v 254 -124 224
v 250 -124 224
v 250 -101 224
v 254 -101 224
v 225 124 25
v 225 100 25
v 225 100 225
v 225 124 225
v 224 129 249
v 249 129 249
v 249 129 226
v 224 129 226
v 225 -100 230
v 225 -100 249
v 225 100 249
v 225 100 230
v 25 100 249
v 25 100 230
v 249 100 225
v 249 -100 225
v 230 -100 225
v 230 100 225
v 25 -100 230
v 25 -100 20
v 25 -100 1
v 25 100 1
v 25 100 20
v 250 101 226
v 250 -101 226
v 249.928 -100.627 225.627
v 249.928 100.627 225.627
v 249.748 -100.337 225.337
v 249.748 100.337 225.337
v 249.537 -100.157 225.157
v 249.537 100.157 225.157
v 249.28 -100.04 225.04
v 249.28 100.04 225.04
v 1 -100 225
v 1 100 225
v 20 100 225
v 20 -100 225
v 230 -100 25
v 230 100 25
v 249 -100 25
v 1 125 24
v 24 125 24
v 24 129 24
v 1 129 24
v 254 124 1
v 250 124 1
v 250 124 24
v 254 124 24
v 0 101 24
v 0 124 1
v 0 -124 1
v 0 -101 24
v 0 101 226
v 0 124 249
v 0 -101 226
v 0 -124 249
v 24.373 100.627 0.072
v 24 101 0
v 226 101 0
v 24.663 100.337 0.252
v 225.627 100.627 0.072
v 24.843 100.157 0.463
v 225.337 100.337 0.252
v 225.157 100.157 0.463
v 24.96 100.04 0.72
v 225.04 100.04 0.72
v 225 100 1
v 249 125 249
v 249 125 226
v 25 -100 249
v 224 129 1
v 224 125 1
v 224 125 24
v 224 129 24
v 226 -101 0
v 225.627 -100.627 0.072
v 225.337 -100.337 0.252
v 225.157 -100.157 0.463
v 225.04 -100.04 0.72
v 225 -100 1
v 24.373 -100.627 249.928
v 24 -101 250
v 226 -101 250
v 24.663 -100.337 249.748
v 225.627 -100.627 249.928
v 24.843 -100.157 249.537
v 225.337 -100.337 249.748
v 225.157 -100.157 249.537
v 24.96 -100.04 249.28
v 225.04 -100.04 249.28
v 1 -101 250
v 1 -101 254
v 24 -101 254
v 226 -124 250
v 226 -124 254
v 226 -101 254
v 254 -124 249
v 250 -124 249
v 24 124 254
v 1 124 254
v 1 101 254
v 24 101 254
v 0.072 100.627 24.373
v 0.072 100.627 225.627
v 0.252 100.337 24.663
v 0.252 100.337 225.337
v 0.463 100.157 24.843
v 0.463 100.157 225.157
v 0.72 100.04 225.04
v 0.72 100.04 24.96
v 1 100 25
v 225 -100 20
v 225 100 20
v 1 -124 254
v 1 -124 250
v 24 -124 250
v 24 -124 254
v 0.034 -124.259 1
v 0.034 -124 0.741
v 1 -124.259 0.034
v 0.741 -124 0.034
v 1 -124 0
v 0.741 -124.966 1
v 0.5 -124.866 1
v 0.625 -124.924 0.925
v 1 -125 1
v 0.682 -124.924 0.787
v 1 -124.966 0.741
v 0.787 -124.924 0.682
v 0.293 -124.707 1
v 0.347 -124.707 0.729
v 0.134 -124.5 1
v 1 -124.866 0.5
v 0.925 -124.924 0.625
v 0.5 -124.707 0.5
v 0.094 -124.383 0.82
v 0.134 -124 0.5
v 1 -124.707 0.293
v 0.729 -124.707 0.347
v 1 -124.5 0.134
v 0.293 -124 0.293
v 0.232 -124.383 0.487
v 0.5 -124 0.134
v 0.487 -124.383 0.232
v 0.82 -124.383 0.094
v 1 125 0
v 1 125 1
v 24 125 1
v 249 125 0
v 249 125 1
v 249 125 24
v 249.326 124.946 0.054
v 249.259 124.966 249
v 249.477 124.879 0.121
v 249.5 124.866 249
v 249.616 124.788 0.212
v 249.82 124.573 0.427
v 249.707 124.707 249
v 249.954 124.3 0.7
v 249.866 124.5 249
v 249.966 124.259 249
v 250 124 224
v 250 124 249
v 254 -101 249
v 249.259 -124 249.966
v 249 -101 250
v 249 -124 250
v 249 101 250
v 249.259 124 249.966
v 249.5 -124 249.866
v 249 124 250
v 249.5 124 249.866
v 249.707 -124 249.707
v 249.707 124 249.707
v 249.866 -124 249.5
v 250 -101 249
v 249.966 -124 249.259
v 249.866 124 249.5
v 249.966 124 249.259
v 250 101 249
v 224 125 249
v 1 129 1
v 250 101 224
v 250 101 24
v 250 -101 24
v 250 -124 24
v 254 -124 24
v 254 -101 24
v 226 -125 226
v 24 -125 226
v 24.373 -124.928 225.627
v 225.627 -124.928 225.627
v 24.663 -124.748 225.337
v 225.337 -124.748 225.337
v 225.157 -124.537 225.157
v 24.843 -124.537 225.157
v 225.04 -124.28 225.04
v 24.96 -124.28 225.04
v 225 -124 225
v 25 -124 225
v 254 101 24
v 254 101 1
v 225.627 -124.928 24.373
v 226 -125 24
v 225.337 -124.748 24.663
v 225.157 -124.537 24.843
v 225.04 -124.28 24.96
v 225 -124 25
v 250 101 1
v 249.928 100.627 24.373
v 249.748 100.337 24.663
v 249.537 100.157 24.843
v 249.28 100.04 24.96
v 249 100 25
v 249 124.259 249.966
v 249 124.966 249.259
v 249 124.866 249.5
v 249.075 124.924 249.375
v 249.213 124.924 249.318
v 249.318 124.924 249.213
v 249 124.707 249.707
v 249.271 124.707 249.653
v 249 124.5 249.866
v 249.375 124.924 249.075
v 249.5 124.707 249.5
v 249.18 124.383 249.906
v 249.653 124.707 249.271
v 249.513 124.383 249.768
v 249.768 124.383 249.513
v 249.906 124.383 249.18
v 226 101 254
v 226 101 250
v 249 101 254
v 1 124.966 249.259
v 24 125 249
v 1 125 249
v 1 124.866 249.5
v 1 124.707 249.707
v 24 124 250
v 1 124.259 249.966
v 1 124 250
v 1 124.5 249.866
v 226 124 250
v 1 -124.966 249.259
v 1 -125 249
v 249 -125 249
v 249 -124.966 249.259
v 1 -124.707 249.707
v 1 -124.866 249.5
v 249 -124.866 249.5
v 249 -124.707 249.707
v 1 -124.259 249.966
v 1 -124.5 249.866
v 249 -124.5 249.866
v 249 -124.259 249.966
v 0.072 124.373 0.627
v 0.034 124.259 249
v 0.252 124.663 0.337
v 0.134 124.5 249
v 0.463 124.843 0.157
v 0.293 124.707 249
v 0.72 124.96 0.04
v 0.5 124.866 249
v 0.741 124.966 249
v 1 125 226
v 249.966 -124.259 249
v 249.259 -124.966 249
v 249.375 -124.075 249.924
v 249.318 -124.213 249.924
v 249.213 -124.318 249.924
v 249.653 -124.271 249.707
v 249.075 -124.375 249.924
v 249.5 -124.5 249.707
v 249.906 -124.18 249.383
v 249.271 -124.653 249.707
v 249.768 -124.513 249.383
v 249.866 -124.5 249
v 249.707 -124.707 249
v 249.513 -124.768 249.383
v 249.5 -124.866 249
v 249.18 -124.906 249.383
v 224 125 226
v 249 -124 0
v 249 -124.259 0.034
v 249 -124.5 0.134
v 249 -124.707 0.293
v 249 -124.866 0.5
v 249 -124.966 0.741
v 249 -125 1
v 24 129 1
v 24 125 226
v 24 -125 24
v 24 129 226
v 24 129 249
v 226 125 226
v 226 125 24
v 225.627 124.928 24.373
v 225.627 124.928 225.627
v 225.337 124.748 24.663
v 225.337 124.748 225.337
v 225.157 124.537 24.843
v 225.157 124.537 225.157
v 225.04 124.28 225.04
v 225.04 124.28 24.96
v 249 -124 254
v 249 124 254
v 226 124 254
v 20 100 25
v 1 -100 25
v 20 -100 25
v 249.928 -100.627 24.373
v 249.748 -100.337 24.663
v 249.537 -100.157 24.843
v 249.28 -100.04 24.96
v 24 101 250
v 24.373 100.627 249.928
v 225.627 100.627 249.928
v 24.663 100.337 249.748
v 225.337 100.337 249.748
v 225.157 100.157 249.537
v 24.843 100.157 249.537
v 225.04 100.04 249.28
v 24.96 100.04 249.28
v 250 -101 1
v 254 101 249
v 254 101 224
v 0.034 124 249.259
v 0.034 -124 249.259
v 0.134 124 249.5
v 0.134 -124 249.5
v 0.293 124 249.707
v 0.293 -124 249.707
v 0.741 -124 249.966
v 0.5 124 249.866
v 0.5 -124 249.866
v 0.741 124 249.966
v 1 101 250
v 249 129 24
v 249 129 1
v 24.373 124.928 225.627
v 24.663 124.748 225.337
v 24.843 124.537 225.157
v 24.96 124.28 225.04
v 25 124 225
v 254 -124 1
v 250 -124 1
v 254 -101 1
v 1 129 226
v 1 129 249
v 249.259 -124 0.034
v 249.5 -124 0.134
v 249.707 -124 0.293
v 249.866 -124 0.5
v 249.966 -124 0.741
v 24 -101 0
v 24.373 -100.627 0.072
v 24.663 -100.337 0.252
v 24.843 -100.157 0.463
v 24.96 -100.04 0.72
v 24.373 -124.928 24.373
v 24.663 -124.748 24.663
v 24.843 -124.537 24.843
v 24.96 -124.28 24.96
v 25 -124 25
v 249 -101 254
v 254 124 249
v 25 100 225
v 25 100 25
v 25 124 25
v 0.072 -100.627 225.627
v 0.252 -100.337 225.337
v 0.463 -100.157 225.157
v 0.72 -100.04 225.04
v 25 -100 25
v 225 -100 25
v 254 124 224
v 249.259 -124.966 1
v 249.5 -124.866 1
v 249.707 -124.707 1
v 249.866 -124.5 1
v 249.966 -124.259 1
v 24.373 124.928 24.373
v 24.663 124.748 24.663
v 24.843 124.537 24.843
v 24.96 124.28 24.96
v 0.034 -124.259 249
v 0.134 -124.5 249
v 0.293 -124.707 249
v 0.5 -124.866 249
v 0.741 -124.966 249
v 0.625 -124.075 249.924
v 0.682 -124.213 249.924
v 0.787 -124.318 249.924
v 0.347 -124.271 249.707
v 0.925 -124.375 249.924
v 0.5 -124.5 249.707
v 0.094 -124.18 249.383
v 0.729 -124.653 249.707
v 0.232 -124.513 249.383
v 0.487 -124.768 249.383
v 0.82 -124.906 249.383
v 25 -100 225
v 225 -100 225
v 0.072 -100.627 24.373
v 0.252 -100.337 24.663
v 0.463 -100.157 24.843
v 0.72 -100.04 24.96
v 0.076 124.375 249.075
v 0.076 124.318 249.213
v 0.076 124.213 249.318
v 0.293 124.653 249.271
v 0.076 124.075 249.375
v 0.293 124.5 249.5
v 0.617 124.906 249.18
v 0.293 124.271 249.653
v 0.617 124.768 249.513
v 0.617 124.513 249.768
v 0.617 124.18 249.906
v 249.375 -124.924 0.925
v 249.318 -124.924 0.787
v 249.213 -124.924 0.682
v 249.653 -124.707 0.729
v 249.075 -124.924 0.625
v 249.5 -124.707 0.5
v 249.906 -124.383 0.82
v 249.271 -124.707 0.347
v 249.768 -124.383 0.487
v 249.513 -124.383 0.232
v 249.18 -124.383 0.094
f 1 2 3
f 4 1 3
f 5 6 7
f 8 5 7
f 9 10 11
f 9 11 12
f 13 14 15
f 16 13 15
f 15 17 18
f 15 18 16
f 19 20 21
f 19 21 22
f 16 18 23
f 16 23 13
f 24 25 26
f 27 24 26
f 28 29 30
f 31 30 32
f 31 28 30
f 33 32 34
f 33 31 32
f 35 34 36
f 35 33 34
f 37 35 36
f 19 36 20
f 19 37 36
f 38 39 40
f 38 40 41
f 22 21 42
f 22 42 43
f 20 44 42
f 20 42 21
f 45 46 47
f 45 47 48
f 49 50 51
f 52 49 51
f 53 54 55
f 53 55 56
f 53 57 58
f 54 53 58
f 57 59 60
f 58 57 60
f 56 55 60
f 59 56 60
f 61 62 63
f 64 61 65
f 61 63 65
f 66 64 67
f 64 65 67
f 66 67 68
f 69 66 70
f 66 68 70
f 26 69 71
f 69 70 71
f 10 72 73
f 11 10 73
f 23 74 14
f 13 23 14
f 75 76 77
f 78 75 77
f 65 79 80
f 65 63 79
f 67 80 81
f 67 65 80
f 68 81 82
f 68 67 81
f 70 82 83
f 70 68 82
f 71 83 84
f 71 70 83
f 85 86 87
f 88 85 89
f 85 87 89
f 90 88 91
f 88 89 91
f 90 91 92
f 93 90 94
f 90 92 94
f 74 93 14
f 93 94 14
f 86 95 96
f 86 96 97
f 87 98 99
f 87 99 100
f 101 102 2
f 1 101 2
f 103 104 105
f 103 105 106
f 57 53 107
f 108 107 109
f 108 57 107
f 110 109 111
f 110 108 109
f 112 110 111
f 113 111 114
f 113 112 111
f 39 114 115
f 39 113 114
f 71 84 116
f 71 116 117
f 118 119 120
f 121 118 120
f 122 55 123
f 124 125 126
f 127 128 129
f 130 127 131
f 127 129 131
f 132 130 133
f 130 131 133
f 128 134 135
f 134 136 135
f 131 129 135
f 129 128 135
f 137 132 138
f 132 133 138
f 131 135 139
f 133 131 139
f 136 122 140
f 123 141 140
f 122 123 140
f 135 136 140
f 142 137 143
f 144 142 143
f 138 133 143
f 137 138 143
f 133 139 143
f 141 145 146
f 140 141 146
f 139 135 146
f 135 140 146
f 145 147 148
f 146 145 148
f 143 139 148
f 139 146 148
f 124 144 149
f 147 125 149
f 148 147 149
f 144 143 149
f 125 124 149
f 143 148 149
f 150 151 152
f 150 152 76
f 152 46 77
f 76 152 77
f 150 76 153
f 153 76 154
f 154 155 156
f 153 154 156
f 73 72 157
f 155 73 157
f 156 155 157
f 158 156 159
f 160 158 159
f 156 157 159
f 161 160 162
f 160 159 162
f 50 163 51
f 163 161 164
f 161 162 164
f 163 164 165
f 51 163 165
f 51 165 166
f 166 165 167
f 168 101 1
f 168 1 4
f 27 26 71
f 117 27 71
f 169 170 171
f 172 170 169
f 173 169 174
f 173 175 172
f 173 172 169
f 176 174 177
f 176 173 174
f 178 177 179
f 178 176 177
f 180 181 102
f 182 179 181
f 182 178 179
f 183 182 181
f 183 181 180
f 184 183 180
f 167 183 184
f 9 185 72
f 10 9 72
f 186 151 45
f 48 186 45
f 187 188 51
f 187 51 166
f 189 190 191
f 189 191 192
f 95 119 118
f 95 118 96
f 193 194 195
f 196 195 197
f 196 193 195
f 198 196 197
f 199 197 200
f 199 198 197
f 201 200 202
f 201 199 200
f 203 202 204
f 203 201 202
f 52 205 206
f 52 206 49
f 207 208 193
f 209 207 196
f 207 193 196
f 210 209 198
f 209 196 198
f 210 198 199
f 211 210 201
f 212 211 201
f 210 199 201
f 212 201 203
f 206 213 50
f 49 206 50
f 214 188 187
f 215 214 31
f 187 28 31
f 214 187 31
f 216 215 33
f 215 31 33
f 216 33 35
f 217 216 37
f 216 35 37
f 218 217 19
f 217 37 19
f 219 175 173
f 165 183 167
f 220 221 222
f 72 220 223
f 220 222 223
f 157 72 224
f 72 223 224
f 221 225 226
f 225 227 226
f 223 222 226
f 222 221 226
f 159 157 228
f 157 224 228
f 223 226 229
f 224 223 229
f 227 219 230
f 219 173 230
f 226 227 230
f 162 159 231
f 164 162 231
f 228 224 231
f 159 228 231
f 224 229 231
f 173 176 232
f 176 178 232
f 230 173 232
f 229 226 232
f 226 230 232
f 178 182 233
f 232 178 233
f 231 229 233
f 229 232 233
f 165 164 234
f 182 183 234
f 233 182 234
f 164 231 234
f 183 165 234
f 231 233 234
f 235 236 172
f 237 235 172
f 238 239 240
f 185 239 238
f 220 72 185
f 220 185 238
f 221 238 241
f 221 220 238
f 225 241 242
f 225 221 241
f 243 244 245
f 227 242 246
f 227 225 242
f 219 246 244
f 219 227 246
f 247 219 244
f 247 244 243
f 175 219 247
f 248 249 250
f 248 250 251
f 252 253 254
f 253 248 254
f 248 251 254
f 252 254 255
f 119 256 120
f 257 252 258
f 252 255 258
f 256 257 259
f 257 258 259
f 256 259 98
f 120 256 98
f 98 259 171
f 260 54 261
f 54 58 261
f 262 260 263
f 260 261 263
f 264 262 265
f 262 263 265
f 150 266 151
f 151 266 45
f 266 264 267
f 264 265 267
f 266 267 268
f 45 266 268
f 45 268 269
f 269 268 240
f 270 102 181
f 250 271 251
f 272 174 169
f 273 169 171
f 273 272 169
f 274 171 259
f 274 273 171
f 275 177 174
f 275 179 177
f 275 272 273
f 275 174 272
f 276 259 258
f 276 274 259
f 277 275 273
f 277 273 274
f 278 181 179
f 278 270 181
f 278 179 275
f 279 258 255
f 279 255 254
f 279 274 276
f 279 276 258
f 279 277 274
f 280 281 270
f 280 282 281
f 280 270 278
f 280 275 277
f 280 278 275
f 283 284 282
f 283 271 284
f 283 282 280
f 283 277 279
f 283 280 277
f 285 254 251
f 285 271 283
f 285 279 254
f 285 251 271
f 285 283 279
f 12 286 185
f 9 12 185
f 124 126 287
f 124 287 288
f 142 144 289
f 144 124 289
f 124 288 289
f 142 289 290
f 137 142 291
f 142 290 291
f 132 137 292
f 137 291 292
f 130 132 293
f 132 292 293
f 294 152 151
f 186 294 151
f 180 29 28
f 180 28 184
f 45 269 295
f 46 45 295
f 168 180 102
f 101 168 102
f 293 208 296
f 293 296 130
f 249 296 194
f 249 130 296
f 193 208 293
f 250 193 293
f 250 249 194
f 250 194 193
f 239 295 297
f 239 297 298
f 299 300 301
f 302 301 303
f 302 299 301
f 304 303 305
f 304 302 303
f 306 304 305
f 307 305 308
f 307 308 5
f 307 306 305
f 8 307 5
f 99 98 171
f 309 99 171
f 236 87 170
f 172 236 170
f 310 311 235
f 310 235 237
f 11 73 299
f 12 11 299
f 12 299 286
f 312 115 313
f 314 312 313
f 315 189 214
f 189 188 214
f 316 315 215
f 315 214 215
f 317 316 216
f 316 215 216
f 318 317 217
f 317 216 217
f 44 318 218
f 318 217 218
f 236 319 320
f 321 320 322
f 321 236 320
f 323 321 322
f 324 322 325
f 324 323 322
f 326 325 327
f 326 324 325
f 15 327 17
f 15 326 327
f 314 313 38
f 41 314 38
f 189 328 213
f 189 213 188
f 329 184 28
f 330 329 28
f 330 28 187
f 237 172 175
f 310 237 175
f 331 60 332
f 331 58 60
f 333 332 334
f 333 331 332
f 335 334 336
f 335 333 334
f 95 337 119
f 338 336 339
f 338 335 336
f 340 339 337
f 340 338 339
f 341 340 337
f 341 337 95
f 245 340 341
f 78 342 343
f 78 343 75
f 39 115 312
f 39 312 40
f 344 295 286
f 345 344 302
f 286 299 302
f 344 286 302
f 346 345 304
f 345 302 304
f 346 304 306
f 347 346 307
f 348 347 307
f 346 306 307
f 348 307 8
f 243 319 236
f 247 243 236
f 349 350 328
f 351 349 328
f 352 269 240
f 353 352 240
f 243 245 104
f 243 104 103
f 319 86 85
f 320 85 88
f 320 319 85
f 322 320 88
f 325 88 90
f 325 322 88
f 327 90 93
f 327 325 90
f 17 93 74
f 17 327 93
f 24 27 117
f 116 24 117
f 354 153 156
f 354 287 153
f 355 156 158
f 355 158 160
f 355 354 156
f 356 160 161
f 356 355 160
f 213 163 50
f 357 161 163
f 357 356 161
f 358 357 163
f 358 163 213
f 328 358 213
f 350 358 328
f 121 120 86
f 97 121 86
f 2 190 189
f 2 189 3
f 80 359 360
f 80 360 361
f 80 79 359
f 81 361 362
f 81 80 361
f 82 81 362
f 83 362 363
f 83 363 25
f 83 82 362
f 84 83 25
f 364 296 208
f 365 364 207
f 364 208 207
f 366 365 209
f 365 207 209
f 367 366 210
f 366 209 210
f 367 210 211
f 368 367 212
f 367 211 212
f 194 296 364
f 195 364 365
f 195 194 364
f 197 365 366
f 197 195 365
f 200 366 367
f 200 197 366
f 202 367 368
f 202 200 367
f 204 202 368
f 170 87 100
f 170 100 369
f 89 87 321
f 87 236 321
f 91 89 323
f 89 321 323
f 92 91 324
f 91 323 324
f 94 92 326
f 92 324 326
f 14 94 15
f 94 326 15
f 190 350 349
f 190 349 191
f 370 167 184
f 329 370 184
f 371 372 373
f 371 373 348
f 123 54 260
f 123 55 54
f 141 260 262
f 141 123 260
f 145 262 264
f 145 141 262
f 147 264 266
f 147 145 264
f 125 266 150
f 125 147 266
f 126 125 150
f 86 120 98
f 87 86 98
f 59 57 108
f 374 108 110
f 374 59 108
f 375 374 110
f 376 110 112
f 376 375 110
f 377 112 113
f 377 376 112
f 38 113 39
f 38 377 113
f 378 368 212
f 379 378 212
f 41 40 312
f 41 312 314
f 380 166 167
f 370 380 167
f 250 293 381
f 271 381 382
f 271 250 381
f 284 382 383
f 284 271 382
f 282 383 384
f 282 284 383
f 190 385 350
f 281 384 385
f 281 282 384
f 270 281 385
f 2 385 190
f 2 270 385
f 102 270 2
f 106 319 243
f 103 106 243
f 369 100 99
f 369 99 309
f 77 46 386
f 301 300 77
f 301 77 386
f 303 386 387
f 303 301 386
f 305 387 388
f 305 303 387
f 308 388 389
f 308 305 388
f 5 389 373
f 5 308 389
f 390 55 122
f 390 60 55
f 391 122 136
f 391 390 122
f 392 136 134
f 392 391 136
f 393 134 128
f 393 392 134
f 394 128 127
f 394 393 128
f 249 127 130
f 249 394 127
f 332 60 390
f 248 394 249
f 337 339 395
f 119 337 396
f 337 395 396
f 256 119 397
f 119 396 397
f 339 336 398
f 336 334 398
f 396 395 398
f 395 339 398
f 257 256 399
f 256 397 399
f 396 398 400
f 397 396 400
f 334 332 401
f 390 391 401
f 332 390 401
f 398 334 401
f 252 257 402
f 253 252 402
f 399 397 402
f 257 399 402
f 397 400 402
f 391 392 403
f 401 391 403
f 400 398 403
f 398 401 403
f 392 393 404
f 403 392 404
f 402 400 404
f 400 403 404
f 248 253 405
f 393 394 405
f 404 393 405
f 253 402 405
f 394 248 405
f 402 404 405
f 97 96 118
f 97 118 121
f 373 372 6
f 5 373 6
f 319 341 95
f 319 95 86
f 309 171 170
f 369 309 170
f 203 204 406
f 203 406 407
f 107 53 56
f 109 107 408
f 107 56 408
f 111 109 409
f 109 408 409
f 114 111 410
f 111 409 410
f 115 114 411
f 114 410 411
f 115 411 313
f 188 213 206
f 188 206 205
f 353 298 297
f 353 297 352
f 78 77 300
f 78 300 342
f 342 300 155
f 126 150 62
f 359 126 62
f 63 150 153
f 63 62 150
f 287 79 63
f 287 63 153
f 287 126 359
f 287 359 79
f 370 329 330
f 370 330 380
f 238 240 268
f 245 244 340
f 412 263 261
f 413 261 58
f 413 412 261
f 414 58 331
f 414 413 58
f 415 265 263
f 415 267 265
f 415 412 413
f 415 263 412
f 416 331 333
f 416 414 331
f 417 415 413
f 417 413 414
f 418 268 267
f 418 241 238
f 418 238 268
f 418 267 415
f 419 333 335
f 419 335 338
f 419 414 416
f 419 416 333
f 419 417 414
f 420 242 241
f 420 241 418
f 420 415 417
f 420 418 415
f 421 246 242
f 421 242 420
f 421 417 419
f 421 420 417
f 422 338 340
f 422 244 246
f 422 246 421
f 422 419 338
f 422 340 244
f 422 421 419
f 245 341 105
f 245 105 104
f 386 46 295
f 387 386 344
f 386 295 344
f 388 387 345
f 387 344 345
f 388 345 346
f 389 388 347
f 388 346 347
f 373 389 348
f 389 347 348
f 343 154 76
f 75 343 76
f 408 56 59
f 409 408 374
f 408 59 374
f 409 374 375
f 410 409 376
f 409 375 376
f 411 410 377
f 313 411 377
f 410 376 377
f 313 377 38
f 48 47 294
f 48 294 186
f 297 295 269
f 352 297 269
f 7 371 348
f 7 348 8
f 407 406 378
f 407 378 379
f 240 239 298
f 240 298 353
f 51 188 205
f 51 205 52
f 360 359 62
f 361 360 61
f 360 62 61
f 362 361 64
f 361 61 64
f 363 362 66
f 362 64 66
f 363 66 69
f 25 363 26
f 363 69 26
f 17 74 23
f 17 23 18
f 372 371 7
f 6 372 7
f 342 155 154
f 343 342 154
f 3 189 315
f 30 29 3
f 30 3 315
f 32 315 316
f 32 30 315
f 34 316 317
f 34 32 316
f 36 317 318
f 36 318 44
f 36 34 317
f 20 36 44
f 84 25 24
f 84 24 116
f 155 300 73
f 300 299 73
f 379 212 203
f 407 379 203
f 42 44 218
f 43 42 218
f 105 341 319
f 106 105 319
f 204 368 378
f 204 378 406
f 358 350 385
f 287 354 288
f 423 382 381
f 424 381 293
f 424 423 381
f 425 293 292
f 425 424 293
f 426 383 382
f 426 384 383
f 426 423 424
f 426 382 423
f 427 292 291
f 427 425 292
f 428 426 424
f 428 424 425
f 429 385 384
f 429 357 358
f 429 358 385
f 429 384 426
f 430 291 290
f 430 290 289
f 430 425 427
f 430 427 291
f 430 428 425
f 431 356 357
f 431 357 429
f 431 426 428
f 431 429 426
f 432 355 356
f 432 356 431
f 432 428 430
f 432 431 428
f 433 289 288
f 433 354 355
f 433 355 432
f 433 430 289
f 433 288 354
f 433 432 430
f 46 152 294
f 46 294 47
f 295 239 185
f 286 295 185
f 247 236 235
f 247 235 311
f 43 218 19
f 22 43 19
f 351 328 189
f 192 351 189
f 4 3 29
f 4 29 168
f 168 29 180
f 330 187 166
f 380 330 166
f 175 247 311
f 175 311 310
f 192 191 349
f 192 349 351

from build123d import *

# Parameters (mm, degrees)
F0_W      = 250
F0_H      = 250
F0_W_2    = 200
F0_H_2    = 200
F1_DEPTH  = 125
F2_W      = 200
F2_H      = 200
F3_DEPTH  = 100
F4_W      = 200
F4_H      = 200
F5_DEPTH  = 20
F6_W      = 200
F6_H      = 200
F7_DEPTH  = 20
F8_W      = 200
F8_H      = 200
F9_DEPTH  = 20
F10_W     = 200
F10_H     = 200
F11_DEPTH = 20
F12_R     = 1
F13_W     = 23
F13_H     = 23
F14_DEPTH = 4
F15_W     = 23
F15_H     = 23
F16_DEPTH = 4
F17_W     = 23
F17_H     = 23
F18_DEPTH = 4


with BuildPart() as f1:
    # F0 (on Front) → F1 (new body, symmetric)
    with BuildSketch(Plane.XZ):
        with Locations((125, 125)):
            Rectangle(F0_W, F0_H)
        with Locations((125, 125)):
            Rectangle(F0_W_2, F0_H_2, mode=Mode.SUBTRACT)
    extrude(amount=F1_DEPTH, both=True)

    # F2 (on Front) → F3 (join, symmetric)
    with BuildSketch(Plane.XZ):
        with Locations((125, 125)):
            Rectangle(F2_W, F2_H)
    extrude(amount=F3_DEPTH, both=True)

    # F4 (on face) → F5 (cut)
    with BuildSketch(Plane(origin=(0, 0, 0), x_dir=(0, -1, 0), z_dir=(-1, 0, 0))):
        with Locations((0, 125)):
            Rectangle(F4_W, F4_H)
    extrude(amount=-F5_DEPTH, mode=Mode.SUBTRACT)

    # F6 (on face) → F7 (cut)
    with BuildSketch(Plane.YZ.offset(250)):
        with Locations((0, 125)):
            Rectangle(F6_W, F6_H)
    extrude(amount=-F7_DEPTH, mode=Mode.SUBTRACT)

    # F8 (on Top) → F9 (cut)
    with BuildSketch(Plane.XY):
        with Locations((125, 0)):
            Rectangle(F8_W, F8_H)
    extrude(amount=F9_DEPTH, mode=Mode.SUBTRACT)

    # F10 (on face) → F11 (cut)
    with BuildSketch(Plane.XY.offset(250)):
        with Locations((125, 0)):
            Rectangle(F10_W, F10_H)
    extrude(amount=-F11_DEPTH, mode=Mode.SUBTRACT)

    # F12
    f12_edges = [f1.edges().sort_by_distance(p)[0] for p in [
        (25, 0, 0),
        (125, -100, 0),
        (125, 100, 0),
        (225, 0, 0),
        (250, 0, 0),
        (250, 0, 25),
        (250, 100, 125),
        (250, 0, 225),
        (250, -100, 125),
        (250, -125, 125),
        (250, 0, 250),
        (125, 125, 250),
        (250, 125, 125),
        (225, 125, 125),
        (125, 125, 225),
        (25, 125, 125),
        (125, 125, 25),
        (0, 100, 125),
        (0, 0, 25),
        (0, 125, 125),
        (0, 0, 0),
        (0, -125, 125),
        (0, 0, 250),
        (0, 0, 225),
        (0, -100, 125),
        (125, -125, 250),
        (125, -125, 0),
        (25, -125, 125),
        (125, -125, 225),
        (225, -125, 125),
        (125, -125, 25),
        (125, 100, 250),
        (25, 0, 250),
        (125, -100, 250),
        (225, 0, 250),
    ]]
    fillet(f12_edges, radius=F12_R)

    # F13 (on face) → F14 (join)
    with BuildSketch(Plane.XY.offset(250)):
        with Locations((237.5, 112.5)):
            Rectangle(F13_W, F13_H)
        with Locations((237.5, -112.5)):
            Rectangle(F13_W, F13_H)
        with Locations((12.5, -112.5)):
            Rectangle(F13_W, F13_H)
        with Locations((12.5, 112.5)):
            Rectangle(F13_W, F13_H)
    extrude(amount=F14_DEPTH)

    # F15 (on face) → F16 (join)
    with BuildSketch(Plane.YZ.offset(250)):
        Polygon((124, 224), (124, 249), (101, 249), (101, 226), (101, 224), align=None)
        Polygon((-101, 226), (-101, 249), (-124, 249), (-124, 224), (-101, 224), align=None)
        with Locations((-112.5, 12.5)):
            Rectangle(F15_W, F15_H)
        with Locations((112.5, 12.5)):
            Rectangle(F15_W, F15_H)
    extrude(amount=F16_DEPTH)

    # F17 (on face) → F18 (join)
    with BuildSketch(Plane(origin=(0, 125, 0), x_dir=(-1, 0, 0), z_dir=(0, 1, 0))):
        with Locations((-12.5, 12.5)):
            Rectangle(F17_W, F17_H)
        Polygon((-224, 1), (-224, 24), (-226, 24), (-249, 24), (-249, 1), align=None)
        Polygon((-224, 226), (-224, 249), (-249, 249), (-249, 226), (-226, 226), align=None)
        with Locations((-12.5, 237.5)):
            Rectangle(F17_W, F17_H)
    extrude(amount=F18_DEPTH)


solid = f1.part
